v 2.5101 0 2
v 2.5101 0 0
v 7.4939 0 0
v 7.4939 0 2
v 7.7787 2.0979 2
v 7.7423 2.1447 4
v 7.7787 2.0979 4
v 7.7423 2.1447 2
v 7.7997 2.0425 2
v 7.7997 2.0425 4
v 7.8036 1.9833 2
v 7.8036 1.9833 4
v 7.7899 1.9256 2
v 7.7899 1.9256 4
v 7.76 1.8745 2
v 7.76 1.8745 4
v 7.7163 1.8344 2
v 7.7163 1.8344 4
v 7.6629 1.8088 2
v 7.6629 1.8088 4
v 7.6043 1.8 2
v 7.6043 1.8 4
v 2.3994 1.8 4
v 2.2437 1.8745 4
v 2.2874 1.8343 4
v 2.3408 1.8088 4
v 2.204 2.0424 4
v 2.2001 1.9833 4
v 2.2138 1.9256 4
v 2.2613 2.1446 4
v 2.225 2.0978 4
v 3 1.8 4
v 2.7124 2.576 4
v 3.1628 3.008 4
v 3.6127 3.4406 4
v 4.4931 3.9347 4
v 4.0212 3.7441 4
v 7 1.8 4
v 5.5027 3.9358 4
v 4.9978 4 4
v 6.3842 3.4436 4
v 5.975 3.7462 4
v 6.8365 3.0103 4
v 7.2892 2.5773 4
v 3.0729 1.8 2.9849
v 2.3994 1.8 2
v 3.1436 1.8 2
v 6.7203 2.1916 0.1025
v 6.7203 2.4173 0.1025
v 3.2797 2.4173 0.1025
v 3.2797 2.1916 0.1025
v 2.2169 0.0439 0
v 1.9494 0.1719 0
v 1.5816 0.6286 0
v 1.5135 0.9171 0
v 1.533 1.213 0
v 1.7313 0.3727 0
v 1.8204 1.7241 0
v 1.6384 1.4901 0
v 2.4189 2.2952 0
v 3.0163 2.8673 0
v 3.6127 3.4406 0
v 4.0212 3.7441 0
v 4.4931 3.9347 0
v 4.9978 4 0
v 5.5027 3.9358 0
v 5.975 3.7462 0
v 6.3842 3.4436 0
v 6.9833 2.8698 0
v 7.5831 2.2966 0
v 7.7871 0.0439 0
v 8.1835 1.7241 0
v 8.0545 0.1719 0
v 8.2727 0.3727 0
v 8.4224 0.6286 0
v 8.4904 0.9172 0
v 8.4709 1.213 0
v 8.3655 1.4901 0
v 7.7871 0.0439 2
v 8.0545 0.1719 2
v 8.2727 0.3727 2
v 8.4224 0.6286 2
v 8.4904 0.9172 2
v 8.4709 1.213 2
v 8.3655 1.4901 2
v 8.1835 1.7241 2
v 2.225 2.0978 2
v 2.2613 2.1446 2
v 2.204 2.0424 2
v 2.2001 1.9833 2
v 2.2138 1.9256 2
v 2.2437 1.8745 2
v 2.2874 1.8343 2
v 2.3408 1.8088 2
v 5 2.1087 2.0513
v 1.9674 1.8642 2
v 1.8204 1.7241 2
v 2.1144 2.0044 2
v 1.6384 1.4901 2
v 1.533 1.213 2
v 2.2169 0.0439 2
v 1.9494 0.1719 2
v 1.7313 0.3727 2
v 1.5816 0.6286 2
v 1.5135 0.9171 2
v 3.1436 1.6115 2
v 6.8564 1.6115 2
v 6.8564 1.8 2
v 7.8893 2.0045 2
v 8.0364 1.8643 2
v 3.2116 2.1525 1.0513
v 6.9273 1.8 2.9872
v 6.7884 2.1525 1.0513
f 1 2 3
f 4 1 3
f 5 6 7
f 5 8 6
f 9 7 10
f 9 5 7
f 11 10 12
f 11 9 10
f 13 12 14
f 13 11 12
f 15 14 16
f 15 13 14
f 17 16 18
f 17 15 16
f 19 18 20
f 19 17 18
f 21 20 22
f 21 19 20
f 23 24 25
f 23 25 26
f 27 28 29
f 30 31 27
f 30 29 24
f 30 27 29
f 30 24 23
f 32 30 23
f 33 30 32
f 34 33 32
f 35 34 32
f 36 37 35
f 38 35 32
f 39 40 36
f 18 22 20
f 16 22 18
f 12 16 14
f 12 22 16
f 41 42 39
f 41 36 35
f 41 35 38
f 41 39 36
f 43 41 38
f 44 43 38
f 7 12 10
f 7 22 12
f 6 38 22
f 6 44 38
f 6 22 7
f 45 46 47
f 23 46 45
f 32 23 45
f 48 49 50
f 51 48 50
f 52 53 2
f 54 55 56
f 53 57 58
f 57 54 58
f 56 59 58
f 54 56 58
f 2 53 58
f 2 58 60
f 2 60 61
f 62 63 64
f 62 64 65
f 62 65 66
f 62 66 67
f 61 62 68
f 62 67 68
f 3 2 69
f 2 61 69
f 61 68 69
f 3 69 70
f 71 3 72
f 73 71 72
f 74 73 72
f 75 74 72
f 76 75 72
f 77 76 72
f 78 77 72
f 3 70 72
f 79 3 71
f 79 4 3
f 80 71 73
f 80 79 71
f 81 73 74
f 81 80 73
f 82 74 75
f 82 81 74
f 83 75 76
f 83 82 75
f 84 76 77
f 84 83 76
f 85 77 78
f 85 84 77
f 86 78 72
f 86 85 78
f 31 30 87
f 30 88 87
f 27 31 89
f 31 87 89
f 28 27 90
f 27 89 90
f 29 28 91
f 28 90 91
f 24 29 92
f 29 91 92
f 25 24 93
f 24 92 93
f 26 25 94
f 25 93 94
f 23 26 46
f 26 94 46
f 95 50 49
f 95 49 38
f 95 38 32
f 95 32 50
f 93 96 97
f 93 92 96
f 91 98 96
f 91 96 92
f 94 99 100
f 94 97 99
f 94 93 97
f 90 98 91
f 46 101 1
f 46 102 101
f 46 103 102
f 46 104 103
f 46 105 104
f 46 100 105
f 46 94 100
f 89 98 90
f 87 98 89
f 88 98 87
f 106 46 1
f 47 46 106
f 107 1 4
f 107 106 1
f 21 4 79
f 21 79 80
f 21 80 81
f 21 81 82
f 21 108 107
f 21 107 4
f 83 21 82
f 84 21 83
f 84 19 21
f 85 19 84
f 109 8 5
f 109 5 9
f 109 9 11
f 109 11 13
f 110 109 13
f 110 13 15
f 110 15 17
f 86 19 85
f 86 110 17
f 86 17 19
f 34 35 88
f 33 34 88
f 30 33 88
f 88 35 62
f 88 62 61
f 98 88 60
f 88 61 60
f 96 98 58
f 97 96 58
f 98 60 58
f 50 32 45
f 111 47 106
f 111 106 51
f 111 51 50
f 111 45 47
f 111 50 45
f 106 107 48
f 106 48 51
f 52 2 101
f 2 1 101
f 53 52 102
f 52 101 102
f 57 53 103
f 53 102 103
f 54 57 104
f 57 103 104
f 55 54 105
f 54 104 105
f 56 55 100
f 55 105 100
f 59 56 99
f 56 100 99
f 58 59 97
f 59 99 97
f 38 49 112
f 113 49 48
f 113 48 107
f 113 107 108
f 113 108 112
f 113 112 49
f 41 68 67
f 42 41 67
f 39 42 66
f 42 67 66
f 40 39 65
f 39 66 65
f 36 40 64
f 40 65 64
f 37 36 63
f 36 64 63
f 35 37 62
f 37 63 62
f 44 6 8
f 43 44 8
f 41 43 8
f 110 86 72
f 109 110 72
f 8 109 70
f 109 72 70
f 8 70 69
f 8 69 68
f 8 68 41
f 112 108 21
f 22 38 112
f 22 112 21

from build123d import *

# Parameters (mm, degrees)
BOSS_EXTRUDE1_DEPTH = 4
SKETCH4_W           = 8
SKETCH4_H           = 1.8
CUT_EXTRUDE2_DEPTH  = 2
FILLET1_R           = 1
FILLET2_R           = 0.2


with BuildPart() as part:
    # Sketch1 → Boss-Extrude1 (new body)
    with BuildSketch(Plane.XY):
        with BuildLine():
            Line((0, 0), (10, 0))
            ThreePointArc((10, 0), (8.189187828, 1.718754897), (6.384188985, 3.443613817))
            ThreePointArc((6.384188985, 3.443613817), (4.997832528, 3.999998826), (3.612685275, 3.440610236))
            ThreePointArc((3.612685275, 3.440610236), (1.811114467, 1.715294636), (0, 0))
        make_face()
    extrude(amount=BOSS_EXTRUDE1_DEPTH)

    # Cut-Extrude1: read off the stored shape, not the designer's step
    # Cut-Extrude1: loft between two sections, ruled curve by curve
    cut_extrude1_from = [
        Edge.make_line((3.279743704, 2.191579296, 0.102519741), (3.279743704, 2.41730023, 0.102519741)),
        Edge.make_line((3.279743704, 2.41730023, 0.102519741), (6.720256296, 2.41730023, 0.102519741)),
        Edge.make_line((6.720256296, 2.41730023, 0.102519741), (6.720256296, 2.191579296, 0.102519741)),
        Edge.make_line((6.720256296, 2.191579296, 0.102519741), (3.279743704, 2.191579296, 0.102519741)),
    ]
    cut_extrude1_to = [
        Edge.make_line((3, 1, 4), (3, 1.8, 4)),
        Edge.make_line((3, 1.8, 4), (7, 1.8, 4)),
        Edge.make_line((7, 1.8, 4), (7, 1, 4)),
        Edge.make_line((7, 1, 4), (3, 1, 4)),
    ]
    cut_extrude1 = Solid(Shell([*[Face.make_surface_from_curves(cut_extrude1_from[k], cut_extrude1_to[k]) for k in range(4)], Face(Wire(cut_extrude1_from)), Face(Wire(cut_extrude1_to))]))
    add(cut_extrude1, mode=Mode.SUBTRACT)

    # Sketch4 → Cut-Extrude2 (cut)
    with BuildSketch(Plane.XY.offset(4)):
        with Locations((4.997832528, 0.9)):
            Rectangle(SKETCH4_W, SKETCH4_H)
    extrude(amount=-CUT_EXTRUDE2_DEPTH, mode=Mode.SUBTRACT)

    # Fillet1
    fillet1_edges = [part.edges().sort_by_distance(p)[0] for p in [
        (0, 0, 2),
        (10, 0, 2),
    ]]
    fillet(fillet1_edges, radius=FILLET1_R)

    # Fillet2
    fillet2_edges = [part.edges().sort_by_distance(p)[0] for p in [
        (1.900031879, 1.8, 3),
        (8.103893685, 1.8, 3),
    ]]
    fillet(fillet2_edges, radius=FILLET2_R)


solid = part.part
